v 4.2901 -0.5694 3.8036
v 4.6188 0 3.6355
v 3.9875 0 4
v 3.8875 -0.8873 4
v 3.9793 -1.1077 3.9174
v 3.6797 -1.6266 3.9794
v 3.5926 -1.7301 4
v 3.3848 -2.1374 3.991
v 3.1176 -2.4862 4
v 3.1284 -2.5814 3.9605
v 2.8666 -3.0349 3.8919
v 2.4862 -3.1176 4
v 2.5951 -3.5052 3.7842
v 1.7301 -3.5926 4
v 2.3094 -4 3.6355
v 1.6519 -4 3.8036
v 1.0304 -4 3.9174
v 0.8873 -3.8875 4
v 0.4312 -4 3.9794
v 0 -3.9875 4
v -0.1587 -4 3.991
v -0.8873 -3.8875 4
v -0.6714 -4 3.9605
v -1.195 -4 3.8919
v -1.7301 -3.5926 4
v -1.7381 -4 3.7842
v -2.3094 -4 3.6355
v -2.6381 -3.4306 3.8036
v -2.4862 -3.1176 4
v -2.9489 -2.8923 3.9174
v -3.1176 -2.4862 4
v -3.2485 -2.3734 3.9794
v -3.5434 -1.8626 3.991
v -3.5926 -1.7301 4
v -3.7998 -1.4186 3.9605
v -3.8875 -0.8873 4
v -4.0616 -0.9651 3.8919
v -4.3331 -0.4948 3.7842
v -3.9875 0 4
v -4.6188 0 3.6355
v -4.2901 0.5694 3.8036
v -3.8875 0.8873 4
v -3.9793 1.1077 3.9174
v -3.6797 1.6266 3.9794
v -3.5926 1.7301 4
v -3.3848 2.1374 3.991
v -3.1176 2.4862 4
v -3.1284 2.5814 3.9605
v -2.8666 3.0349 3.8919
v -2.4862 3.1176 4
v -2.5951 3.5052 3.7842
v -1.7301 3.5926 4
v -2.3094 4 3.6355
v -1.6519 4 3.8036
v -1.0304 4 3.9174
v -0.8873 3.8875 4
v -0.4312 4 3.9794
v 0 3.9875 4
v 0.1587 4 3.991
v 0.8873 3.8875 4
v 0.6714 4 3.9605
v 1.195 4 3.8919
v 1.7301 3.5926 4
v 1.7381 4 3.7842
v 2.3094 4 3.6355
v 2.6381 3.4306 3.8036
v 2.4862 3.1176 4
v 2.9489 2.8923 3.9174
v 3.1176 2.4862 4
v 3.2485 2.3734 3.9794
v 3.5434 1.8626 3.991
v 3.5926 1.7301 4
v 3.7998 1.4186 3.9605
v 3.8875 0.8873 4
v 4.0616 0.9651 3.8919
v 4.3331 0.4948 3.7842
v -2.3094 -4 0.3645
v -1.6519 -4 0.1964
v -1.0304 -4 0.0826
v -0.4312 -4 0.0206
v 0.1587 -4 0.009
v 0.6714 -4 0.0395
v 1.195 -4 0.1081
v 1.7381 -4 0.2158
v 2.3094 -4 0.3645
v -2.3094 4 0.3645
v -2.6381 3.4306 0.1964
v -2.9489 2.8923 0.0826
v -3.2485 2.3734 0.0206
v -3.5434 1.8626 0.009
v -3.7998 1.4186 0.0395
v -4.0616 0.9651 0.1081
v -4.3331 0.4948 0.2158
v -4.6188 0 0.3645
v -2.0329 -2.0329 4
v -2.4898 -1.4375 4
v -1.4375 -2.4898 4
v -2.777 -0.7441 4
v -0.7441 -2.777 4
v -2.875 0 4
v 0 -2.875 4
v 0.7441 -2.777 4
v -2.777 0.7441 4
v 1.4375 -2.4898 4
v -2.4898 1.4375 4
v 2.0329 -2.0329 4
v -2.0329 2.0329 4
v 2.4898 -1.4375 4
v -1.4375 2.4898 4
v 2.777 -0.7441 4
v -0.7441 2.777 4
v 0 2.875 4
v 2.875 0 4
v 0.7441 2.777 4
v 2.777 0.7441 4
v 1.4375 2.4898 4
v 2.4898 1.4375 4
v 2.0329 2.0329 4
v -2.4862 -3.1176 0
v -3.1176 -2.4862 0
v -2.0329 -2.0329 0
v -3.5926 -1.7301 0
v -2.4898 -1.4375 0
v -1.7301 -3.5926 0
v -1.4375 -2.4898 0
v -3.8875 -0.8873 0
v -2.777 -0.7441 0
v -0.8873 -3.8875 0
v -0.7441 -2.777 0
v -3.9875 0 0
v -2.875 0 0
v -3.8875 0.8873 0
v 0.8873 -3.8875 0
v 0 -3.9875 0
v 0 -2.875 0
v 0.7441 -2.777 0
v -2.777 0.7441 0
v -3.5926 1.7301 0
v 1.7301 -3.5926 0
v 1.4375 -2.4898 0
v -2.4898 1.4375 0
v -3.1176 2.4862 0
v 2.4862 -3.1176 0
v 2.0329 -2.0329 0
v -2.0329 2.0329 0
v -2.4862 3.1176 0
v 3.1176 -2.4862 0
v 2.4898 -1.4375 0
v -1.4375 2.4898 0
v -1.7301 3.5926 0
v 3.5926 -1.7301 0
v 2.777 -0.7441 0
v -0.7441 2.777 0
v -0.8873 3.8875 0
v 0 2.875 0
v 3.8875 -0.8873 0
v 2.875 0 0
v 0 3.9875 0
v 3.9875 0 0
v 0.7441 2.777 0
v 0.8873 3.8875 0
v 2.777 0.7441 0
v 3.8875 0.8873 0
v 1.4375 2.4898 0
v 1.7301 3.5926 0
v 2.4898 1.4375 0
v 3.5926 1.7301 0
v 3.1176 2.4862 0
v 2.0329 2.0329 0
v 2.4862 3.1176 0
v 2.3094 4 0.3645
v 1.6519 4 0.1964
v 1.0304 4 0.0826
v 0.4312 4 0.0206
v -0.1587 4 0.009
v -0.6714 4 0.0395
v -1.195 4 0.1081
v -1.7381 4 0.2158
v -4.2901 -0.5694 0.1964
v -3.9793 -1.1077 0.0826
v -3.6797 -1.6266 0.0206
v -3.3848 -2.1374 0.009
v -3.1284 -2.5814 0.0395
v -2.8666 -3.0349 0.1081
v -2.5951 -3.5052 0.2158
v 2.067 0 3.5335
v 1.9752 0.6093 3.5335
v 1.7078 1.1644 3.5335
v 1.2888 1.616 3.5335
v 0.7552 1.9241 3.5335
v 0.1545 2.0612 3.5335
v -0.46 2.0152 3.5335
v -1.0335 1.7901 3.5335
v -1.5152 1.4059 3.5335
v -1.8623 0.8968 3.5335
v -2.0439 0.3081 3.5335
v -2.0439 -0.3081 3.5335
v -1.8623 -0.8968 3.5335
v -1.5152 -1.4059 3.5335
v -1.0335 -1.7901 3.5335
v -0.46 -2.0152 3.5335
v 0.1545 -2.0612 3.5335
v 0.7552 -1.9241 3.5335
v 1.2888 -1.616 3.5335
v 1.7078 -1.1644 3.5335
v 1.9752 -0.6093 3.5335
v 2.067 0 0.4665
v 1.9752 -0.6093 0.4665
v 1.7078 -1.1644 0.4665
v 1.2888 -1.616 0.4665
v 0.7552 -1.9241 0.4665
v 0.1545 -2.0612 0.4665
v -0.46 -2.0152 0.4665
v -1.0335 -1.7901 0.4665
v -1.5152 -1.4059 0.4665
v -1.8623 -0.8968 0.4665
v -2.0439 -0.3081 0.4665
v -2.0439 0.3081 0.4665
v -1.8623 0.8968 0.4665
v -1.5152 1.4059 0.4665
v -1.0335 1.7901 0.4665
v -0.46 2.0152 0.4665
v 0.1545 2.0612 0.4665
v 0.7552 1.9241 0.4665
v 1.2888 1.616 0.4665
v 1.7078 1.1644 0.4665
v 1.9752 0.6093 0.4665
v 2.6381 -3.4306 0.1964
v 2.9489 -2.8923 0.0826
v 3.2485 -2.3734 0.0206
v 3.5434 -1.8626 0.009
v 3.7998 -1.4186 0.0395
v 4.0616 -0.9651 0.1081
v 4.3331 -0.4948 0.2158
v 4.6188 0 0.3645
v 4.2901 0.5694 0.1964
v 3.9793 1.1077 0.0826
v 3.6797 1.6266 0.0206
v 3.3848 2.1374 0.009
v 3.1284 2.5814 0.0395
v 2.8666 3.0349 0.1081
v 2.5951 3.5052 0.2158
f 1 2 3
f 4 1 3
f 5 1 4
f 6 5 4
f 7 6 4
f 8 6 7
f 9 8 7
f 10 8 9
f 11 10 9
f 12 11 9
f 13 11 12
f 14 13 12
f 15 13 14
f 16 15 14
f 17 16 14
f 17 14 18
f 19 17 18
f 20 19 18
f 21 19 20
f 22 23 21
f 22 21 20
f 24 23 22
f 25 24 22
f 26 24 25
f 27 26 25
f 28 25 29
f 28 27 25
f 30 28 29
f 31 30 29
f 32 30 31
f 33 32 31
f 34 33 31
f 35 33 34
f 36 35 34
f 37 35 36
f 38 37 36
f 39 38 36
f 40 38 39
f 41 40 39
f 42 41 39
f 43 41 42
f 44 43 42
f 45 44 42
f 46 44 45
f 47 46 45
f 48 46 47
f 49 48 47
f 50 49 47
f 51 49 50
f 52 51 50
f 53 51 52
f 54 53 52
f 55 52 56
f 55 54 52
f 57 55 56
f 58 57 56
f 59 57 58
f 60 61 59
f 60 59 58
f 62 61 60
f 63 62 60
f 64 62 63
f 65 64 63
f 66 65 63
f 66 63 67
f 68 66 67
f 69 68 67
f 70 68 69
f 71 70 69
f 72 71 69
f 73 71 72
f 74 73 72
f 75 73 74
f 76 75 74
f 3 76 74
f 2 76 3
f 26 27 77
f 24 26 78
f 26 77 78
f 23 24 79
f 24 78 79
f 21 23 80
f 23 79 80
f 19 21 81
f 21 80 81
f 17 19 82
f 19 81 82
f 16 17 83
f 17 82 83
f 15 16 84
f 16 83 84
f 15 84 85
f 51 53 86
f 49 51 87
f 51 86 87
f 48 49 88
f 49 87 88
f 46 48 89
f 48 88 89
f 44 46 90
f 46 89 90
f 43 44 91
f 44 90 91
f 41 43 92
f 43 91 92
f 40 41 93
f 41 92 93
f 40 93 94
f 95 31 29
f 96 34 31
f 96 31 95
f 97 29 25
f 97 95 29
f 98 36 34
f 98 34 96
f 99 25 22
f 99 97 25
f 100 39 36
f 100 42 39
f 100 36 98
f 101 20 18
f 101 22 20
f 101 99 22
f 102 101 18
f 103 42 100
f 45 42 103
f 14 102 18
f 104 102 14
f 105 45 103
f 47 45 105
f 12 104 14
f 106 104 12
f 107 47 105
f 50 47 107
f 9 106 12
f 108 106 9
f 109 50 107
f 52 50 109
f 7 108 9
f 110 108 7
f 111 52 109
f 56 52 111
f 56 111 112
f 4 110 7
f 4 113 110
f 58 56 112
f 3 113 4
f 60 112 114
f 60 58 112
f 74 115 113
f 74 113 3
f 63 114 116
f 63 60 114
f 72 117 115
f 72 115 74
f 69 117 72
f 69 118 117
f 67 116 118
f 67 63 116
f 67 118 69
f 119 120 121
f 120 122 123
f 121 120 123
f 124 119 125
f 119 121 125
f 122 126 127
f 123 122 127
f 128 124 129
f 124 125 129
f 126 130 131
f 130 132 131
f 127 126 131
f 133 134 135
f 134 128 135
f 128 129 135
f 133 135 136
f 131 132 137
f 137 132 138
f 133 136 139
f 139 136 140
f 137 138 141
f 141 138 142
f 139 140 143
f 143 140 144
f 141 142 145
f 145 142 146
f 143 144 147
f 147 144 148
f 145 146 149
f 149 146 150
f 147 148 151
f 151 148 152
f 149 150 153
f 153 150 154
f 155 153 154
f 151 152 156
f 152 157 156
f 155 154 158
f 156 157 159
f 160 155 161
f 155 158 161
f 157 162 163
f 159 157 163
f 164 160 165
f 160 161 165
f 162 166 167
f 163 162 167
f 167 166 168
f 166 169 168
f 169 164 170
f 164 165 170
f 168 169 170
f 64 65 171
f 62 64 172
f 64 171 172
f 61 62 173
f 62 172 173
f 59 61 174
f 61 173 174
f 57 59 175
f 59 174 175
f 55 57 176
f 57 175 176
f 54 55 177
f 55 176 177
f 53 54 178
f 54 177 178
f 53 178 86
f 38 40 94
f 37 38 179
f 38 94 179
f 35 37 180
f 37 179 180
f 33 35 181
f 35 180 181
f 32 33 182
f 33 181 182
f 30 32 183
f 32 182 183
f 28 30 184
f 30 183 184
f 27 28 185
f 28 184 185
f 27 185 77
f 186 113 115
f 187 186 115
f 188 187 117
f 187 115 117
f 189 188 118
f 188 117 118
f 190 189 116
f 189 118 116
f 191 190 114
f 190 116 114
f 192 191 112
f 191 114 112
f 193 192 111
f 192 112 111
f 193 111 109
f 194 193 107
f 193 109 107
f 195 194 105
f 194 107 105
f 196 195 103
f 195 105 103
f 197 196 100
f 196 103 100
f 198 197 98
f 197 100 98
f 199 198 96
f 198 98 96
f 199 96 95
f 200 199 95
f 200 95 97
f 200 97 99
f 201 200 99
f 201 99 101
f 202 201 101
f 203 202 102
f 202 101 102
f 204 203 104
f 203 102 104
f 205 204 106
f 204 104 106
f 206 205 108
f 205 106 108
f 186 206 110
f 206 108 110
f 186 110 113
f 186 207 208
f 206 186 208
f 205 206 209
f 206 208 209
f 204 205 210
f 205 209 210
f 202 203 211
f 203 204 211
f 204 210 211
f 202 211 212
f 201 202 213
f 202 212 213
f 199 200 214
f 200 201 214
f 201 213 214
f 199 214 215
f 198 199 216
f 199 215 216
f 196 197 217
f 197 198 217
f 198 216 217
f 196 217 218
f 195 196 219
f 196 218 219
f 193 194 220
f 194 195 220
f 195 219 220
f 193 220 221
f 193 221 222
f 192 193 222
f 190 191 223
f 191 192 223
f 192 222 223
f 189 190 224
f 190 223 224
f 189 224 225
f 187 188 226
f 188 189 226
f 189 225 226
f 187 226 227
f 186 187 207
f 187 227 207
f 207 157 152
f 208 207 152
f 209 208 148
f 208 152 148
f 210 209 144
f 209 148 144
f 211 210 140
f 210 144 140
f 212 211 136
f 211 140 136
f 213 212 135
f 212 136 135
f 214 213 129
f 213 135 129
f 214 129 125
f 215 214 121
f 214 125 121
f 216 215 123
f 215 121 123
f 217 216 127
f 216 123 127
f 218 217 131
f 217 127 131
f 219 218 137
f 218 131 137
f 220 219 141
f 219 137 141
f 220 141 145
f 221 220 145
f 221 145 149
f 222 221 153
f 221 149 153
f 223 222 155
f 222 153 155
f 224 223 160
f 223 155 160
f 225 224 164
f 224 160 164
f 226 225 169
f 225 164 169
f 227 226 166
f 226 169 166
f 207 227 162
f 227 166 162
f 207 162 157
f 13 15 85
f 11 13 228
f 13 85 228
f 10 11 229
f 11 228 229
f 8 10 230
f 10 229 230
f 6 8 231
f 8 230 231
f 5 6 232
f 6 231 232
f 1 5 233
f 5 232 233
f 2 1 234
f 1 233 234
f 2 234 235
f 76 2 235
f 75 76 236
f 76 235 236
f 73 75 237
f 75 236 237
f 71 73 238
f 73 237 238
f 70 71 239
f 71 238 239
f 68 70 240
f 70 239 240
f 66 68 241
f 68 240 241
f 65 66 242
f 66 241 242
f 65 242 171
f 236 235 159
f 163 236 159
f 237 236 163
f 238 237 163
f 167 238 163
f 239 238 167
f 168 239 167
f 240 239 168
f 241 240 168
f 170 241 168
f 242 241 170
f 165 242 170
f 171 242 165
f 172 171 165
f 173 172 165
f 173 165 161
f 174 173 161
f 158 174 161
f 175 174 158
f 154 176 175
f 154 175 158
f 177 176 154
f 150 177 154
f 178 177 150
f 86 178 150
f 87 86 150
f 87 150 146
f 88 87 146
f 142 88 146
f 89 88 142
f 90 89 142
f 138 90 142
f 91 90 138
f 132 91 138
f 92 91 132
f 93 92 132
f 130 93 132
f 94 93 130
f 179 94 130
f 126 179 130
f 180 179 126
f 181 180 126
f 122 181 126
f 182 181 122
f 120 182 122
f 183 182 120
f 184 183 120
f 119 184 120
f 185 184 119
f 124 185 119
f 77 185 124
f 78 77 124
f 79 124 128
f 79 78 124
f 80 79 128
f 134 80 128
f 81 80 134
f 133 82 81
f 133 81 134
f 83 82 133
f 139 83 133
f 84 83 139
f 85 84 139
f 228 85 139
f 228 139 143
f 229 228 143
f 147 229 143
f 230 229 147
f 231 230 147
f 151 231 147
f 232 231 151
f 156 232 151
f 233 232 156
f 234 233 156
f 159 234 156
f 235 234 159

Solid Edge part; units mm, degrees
sketch "Sketch1" plane through (0, 0, 0) normal (0, 0, 1) x (1, 0, 0)
  circle A0 centre (0, 0) radius 2.067
  circle A1 centre (0, 0) radius 4.6188
  dimension "D1" = 4
  dimension "D2" = 4.134
extrude "Protrusion1" add sketch "Sketch1" along normal blind 4
sketch "Sketch2" plane through (0, 0, 0) normal (0, 0, 1) x (1, 0, 0)
  line L0 (4.6188, 0) -> (2.3094, 4)
  arc A0 (2.3094, 4) -> (4.6188, 0) centre (0, 0) cw
  dimension "D1" = 4
extrude "ExtrudedCutout_1" cut sketch "Sketch2" along normal blind 4
pattern_circular "Pattern1" count 6 over 360 about axis through (0, 0, 0) along (0, 0, -1) of "ExtrudedCutout_1"
cosmetic_thread "Thread_1" size "M5" thread depth 4
sketch "Sketch3" plane through (0, 0, 0) normal (0, -1, 0) x (1, 0, 0)
  line L0 (4.6188, 0.3645) -> (3.9875, 0)
  line L1 (3.9875, 0) -> (4.6188, 0)
  line L2 (4.6188, 0) -> (4.6188, 0.3645)
  line L3 (3.9875, 4) -> (4.6188, 4)
  line L4 (4.6188, 4) -> (4.6188, 3.6355)
  line L5 (4.6188, 3.6355) -> (3.9875, 4)
  dimension "D1" = 4
  dimension "D2" = 3.9875
  dimension "D3" = 4.6188
revolve "RevolvedCutout_1" cut sketch "Sketch3" angle 360 about axis through (0, 0, 8.4) along (0, 0, -1)
chamfer "Chamfer_1" distance 0.808 angle 30 1 edges at (-2.067, 0, 0) measured on face at (-2.7381, -2.5786, 0)
chamfer "Chamfer_2" distance 0.808 angle 30 1 edges at (-2.067, 0, 4) measured on face at (-2.7381, -2.5786, 4)
properties material "Stahl"
